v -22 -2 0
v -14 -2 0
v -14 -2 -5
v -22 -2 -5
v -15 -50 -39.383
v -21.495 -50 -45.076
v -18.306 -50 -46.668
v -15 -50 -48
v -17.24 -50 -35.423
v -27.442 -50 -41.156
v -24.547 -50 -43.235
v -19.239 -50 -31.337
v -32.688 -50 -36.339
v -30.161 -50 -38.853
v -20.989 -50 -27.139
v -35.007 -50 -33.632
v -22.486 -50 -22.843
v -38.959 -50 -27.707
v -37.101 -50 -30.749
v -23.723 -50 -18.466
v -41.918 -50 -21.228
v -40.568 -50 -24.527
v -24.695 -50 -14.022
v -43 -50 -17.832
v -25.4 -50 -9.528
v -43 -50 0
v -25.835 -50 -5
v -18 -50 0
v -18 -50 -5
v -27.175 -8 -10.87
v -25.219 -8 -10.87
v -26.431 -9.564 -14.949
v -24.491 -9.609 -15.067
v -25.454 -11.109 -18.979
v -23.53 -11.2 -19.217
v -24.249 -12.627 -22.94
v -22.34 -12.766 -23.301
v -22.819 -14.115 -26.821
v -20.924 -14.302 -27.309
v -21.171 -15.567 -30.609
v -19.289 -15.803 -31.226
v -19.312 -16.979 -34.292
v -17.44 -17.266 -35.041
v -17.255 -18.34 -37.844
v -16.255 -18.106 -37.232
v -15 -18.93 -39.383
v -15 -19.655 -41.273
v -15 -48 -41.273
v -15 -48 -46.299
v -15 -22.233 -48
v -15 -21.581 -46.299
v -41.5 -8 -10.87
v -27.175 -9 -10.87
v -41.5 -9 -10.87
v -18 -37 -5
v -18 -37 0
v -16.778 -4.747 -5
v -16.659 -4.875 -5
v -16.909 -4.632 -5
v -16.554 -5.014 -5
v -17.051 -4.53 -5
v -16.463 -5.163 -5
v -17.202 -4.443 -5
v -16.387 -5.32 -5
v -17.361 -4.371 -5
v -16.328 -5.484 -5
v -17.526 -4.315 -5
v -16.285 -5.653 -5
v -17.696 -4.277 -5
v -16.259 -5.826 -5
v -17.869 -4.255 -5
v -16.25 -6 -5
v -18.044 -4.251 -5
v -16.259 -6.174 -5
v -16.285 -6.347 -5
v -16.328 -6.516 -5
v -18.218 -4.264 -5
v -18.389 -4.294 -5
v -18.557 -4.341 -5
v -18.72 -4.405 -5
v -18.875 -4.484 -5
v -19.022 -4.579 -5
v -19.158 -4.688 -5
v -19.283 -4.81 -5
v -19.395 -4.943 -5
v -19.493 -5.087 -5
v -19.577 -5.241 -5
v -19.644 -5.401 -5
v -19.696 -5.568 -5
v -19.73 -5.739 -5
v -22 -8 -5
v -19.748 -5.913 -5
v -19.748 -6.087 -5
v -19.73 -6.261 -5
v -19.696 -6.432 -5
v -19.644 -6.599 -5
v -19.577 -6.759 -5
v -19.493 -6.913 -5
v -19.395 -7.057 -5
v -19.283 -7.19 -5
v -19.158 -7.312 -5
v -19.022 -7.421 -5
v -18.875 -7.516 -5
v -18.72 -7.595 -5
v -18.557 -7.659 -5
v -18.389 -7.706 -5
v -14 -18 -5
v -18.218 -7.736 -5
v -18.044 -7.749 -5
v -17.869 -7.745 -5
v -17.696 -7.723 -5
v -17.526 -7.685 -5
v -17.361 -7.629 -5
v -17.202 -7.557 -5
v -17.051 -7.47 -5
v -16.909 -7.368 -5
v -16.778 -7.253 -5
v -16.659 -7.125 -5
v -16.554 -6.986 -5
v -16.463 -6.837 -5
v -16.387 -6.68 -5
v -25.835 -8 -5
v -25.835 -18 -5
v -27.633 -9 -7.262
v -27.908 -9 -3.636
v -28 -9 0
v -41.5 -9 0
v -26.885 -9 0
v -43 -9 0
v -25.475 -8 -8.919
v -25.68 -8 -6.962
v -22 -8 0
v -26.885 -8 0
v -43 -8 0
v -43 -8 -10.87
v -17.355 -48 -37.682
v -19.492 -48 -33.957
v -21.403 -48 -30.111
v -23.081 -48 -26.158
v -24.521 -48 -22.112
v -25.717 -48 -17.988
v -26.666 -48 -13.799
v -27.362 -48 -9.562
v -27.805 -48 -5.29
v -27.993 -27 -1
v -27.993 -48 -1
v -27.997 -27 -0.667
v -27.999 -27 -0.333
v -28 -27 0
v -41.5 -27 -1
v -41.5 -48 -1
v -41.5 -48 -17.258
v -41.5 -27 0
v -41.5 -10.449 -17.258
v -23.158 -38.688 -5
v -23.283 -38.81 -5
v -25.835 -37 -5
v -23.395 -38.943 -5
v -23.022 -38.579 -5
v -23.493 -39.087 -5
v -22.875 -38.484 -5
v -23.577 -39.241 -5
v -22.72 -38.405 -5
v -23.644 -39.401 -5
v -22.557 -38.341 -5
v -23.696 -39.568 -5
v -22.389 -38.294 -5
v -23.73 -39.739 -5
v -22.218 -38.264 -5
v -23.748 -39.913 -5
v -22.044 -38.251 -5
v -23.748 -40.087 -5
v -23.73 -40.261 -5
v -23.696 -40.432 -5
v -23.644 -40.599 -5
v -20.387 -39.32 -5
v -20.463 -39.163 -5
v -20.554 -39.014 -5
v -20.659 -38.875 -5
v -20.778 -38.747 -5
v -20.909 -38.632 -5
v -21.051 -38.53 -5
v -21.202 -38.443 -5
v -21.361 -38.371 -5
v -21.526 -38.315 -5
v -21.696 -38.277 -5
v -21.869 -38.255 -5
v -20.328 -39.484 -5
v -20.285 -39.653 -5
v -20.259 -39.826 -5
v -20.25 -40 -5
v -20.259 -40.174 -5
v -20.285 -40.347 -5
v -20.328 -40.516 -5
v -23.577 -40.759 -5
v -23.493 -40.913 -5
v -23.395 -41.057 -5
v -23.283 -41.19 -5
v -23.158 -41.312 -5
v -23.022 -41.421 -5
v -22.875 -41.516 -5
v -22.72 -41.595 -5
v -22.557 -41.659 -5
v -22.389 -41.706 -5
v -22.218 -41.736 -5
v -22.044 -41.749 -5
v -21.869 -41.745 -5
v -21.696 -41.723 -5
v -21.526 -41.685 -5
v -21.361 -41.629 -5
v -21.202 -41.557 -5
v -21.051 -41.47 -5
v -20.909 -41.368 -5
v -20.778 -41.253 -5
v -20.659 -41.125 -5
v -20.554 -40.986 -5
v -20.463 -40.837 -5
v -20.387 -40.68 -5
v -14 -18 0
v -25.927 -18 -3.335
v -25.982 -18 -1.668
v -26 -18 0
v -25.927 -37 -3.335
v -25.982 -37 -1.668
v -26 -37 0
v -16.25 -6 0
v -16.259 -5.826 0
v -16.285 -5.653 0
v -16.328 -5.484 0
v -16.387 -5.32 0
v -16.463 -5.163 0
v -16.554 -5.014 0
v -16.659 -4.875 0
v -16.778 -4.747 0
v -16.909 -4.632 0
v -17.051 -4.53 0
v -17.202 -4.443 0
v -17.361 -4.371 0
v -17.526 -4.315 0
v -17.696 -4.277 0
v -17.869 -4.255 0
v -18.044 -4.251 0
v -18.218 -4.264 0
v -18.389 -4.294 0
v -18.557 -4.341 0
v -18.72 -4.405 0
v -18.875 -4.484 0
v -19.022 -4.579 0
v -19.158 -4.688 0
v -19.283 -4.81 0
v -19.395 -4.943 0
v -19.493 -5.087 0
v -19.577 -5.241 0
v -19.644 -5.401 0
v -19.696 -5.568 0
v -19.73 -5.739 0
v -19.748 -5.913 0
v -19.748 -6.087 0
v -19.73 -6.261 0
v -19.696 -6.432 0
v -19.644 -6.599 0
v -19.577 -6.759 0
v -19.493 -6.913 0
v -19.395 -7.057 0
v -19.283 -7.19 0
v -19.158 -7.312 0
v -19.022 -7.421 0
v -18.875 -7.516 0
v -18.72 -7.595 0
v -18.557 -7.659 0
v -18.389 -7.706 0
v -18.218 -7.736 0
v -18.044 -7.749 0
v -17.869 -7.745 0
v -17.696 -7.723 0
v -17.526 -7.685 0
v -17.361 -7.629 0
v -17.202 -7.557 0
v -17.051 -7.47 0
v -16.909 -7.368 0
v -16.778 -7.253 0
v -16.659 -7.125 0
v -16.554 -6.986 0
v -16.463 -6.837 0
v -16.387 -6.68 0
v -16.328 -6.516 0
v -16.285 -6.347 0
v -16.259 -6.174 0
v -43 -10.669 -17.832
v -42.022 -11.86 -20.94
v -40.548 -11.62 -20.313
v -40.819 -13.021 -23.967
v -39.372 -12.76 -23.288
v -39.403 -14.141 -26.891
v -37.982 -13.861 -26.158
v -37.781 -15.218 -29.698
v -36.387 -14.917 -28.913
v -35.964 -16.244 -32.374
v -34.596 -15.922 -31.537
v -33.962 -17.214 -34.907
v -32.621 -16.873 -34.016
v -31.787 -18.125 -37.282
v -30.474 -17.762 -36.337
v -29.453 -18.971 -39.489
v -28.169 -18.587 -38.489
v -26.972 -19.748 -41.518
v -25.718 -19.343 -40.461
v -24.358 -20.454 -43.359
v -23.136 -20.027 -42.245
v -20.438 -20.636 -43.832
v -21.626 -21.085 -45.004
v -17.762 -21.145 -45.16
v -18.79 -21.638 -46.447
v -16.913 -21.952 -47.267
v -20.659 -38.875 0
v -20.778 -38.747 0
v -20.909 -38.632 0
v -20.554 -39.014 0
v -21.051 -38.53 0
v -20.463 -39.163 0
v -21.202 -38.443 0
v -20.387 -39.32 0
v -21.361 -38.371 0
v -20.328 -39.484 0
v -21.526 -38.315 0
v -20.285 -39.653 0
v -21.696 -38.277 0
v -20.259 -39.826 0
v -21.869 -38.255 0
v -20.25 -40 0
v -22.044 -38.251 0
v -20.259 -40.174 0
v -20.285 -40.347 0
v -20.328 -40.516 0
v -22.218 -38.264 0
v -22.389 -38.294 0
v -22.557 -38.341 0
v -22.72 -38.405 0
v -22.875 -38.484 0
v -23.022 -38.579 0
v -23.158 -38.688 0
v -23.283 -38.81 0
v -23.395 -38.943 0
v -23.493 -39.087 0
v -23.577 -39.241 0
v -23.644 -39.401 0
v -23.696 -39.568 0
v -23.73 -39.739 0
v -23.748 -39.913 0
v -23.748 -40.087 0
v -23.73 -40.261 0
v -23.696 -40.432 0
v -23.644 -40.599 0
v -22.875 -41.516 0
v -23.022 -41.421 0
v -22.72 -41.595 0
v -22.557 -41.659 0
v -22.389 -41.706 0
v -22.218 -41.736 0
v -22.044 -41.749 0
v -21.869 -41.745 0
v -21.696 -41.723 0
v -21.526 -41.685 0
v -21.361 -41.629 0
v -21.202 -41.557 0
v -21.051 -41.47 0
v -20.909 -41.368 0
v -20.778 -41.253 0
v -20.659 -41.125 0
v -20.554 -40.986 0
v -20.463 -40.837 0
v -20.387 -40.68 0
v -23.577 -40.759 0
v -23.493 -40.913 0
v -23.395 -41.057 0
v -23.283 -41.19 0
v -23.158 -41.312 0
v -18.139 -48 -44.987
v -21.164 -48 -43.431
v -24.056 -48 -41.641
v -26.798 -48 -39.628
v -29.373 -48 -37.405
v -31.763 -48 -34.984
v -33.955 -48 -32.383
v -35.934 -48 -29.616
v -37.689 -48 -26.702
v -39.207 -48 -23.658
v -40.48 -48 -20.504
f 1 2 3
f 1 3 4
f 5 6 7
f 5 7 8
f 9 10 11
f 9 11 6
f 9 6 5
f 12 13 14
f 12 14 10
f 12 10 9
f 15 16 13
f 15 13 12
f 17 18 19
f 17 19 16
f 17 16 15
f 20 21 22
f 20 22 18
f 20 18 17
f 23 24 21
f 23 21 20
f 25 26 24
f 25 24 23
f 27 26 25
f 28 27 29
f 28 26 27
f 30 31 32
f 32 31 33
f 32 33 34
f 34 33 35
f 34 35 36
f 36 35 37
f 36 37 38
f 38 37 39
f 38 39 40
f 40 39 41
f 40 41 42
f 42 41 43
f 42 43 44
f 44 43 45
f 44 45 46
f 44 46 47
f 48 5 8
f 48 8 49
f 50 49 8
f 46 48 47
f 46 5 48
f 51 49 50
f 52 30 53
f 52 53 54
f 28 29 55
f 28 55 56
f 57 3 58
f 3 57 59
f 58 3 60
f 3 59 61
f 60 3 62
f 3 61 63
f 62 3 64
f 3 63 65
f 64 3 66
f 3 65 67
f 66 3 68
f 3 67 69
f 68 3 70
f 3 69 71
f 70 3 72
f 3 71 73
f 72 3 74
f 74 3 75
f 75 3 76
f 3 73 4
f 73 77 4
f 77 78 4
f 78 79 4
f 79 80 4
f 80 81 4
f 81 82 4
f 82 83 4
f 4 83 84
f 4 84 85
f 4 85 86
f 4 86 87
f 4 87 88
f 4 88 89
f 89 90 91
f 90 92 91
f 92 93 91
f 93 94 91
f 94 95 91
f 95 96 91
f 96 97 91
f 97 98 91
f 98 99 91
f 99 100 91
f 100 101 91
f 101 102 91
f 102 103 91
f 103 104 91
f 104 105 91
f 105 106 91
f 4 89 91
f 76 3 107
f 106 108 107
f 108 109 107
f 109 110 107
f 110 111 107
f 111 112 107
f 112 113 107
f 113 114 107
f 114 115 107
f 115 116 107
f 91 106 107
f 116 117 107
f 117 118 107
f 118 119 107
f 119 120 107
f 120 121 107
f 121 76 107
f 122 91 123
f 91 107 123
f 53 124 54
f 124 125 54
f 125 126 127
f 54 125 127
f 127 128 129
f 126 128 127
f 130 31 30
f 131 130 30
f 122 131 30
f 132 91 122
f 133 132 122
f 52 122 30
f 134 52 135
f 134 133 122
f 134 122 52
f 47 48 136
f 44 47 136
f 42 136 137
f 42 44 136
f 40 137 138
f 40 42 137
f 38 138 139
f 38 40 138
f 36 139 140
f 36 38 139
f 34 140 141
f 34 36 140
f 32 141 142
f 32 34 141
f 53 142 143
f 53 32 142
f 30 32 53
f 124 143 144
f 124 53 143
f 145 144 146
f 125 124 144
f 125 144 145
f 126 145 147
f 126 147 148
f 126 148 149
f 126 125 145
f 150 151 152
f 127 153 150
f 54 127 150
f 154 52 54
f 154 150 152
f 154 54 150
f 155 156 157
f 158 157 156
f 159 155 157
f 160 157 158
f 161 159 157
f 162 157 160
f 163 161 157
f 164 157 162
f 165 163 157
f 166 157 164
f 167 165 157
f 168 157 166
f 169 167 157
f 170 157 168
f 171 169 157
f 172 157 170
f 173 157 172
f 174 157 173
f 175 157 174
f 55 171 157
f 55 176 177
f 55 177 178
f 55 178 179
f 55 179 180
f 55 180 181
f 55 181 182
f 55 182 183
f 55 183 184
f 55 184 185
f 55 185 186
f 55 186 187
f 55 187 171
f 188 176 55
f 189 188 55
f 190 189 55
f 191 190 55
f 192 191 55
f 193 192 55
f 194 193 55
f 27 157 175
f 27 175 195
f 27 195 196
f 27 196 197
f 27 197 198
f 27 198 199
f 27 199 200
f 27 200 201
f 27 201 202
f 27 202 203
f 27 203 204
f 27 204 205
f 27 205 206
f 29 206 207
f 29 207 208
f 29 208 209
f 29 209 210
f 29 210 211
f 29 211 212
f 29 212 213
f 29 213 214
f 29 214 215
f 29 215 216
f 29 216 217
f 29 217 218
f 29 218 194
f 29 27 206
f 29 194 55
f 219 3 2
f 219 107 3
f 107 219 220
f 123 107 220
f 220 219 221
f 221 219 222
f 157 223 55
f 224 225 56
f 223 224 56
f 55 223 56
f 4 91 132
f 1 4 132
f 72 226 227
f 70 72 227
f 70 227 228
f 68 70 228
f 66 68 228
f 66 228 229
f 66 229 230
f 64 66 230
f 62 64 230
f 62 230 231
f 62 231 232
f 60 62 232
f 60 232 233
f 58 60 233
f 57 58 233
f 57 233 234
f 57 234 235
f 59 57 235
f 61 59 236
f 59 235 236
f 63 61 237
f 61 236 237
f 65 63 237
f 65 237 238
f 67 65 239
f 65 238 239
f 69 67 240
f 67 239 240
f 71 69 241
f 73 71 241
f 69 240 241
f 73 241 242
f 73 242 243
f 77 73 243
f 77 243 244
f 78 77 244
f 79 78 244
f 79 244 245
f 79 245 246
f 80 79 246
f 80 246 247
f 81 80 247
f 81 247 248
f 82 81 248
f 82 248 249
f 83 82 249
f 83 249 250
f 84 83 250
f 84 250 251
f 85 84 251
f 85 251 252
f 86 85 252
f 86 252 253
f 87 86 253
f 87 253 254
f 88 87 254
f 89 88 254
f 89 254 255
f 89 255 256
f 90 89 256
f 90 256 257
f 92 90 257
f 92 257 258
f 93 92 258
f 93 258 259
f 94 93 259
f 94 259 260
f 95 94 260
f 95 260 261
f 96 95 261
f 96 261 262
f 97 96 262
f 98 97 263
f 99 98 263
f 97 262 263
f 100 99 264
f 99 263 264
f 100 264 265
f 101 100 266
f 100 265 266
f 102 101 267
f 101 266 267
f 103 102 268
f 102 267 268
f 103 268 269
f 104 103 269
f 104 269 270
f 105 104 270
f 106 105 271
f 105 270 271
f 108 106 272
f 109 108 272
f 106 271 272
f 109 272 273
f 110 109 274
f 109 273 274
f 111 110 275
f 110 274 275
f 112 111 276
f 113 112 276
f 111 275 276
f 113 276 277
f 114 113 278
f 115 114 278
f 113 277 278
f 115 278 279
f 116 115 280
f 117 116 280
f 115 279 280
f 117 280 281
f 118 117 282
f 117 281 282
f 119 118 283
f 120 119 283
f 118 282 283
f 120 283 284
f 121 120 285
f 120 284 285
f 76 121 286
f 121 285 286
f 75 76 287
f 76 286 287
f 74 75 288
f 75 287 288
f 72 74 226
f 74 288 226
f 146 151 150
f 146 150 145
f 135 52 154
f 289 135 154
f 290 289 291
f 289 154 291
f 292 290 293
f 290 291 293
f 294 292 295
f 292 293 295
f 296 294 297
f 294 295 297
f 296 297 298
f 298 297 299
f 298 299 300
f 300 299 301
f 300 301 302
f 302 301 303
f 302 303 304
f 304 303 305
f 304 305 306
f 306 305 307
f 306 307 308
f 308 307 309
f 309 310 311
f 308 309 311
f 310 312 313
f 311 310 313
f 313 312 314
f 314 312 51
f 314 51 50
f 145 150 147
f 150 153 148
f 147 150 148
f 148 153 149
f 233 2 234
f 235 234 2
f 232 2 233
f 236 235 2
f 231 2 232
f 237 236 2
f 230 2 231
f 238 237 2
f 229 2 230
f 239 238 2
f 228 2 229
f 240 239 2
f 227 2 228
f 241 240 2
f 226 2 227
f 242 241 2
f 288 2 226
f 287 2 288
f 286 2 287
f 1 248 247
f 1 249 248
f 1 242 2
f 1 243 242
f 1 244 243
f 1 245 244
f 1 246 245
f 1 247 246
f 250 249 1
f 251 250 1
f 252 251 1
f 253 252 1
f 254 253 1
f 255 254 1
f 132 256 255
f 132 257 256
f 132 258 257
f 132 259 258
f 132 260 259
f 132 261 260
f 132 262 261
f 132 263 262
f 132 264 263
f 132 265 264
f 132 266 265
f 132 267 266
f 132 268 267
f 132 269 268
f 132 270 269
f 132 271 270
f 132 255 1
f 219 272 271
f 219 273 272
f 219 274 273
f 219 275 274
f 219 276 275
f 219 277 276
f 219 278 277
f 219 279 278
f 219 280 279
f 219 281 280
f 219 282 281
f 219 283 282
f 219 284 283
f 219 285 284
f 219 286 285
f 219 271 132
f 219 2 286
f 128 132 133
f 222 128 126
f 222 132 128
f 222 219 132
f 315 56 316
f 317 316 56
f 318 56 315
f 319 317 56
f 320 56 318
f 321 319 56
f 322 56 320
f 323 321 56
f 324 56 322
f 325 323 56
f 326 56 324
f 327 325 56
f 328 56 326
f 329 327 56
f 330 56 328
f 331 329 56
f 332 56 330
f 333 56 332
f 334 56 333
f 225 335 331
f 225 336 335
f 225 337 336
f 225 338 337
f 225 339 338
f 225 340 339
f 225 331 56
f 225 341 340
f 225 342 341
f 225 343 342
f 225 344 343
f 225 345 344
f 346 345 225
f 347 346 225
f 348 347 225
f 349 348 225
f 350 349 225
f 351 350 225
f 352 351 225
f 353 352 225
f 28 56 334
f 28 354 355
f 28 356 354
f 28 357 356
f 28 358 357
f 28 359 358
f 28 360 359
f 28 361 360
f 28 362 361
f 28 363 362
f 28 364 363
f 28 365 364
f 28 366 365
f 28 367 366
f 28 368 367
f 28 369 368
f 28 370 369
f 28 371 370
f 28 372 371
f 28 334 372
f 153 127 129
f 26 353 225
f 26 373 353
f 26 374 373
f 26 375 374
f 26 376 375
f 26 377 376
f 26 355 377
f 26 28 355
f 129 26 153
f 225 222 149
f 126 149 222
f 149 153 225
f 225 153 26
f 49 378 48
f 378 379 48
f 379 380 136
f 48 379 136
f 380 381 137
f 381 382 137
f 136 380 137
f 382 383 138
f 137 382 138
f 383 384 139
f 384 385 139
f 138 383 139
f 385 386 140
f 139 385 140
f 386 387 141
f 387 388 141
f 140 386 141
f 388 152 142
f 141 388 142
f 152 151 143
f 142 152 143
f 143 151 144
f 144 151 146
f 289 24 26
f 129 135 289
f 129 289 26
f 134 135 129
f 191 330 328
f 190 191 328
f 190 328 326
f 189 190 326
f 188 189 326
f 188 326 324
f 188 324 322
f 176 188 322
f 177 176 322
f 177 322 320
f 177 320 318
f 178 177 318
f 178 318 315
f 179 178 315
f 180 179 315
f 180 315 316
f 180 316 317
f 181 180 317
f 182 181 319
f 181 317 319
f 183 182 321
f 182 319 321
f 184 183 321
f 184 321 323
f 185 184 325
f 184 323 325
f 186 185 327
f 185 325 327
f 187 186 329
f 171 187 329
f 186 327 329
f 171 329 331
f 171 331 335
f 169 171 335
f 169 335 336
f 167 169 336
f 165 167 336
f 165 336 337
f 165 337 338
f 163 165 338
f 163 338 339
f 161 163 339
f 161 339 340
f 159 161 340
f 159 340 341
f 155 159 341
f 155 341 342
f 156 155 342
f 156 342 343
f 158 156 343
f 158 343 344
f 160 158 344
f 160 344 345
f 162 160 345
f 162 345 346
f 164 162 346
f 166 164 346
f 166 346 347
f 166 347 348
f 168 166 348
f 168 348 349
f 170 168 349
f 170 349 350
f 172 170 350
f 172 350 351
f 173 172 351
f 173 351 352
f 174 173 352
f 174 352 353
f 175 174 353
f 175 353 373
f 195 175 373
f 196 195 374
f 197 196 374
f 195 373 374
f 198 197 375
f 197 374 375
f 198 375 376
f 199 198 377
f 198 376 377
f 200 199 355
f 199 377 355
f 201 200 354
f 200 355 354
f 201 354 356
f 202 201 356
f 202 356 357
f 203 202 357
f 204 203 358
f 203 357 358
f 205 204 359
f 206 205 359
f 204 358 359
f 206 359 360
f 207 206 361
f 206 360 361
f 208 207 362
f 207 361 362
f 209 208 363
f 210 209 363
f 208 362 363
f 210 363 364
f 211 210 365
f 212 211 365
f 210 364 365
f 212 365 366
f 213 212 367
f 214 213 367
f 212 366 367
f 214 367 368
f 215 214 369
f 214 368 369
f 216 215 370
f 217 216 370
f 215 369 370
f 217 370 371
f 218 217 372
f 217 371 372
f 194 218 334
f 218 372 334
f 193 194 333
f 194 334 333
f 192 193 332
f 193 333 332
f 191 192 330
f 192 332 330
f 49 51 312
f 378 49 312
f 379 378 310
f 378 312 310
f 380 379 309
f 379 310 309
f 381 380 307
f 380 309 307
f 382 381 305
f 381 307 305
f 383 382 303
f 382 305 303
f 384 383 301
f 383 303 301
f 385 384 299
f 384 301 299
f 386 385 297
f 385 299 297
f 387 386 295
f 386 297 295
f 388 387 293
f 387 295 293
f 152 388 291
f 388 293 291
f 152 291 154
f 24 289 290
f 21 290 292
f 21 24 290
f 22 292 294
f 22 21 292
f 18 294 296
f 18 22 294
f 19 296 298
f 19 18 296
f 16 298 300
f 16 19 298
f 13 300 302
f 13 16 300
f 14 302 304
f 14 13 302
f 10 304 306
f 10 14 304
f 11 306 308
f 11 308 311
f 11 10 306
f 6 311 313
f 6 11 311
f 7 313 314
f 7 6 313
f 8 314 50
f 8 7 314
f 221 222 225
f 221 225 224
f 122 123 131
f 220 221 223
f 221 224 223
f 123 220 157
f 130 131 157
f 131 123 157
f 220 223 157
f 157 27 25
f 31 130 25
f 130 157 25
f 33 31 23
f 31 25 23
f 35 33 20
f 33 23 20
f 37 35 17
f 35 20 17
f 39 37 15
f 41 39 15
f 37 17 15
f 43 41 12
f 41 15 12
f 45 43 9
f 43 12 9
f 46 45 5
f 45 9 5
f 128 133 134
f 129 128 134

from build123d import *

# Parameters (mm, degrees)
SKETCH_W        = 28
SKETCH_H        = 42
PAD_DEPTH       = 48
POCKET_DEPTH    = 42.001
POCKET001_DEPTH = 28.001
POCKET002_DEPTH = 40
POCKET003_DEPTH = 42.001
SKETCH005_W     = 12.884712
SKETCH005_H     = 5
PAD001_DEPTH    = 10
SKETCH006_W     = 8
SKETCH006_H     = 5
PAD002_DEPTH    = 6
SKETCH007_W     = 9
SKETCH007_H     = 5
PAD003_DEPTH    = 13
SKETCH009_R     = 1.75
POCKET004_DEPTH = 6
SKETCH010_W     = 16.115288
SKETCH010_H     = 23
PAD004_DEPTH    = 1
SKETCH011_W     = 16.115288
SKETCH011_H     = 10.869565
PAD005_DEPTH    = 1


with BuildPart() as part:
    # Sketch → Pad (new body)
    with BuildSketch(Plane.XY):
        with Locations((-29, -29)):
            Rectangle(SKETCH_W, SKETCH_H)
    extrude(amount=-PAD_DEPTH)

    # Sketch001 (on Face3 of Pad) → Pocket (cut, through all)
    with BuildSketch(Plane.XZ.offset(50)):
        with BuildLine():
            ThreePointArc((-43, -17.83216), (-32.688295, -36.339337), (-15, -48))
            Line((-15, -48), (-62.101535, -92.662663))
            Line((-43, -17.83216), (-62.101535, -92.662663))
        make_face()
    extrude(amount=-POCKET_DEPTH, mode=Mode.SUBTRACT)

    # Sketch002 (on Face3 of Pocket) → Pocket001 (cut, through all)
    with BuildSketch(Plane.YZ.offset(-15)):
        Polygon((0, 10), (-23, -50), (20.241647, -57.218418), align=None)
    extrude(amount=-POCKET001_DEPTH, mode=Mode.SUBTRACT)

    # Sketch003 (on Face1 of Pocket001) → Pocket002 (cut)
    with BuildSketch(Plane(origin=(0, -8, 0), x_dir=(-1, 0, 0), z_dir=(0, 1, 0))):
        with BuildLine():
            Line((41.5, 3), (41.5, -17.25833))
            ThreePointArc((12.43, -47.164245), (30.833459, -35.971617), (41.5, -17.25833))
            Line((12.43, -44.72372), (12.43, -47.164245))
            ThreePointArc((12.43, -44.72372), (23.996206, -23.678239), (28, 0))
            Line((28, 3), (28, 0))
            Line((41.5, 3), (28, 3))
        make_face()
    extrude(amount=-POCKET002_DEPTH, mode=Mode.SUBTRACT)

    # Sketch004 (on Face10 of Pocket002) → Pocket003 (cut, through all)
    with BuildSketch(Plane.XZ.offset(50)):
        with BuildLine():
            ThreePointArc((-26, 0), (-13.012856, -42.489763), (21.51, -70.45793))
            Line((21.51, -70.45793), (50, 0))
            Line((-26, 0), (50, 0))
        make_face()
    extrude(amount=-POCKET003_DEPTH, mode=Mode.SUBTRACT)

    # Sketch005 (on Face1 of Pocket003) → Pad001 (join)
    with BuildSketch(Plane(origin=(0, -8, 0), x_dir=(-1, 0, 0), z_dir=(0, 1, 0))):
        with Locations((20.442356, -2.5)):
            Rectangle(SKETCH005_W, SKETCH005_H)
    extrude(amount=-PAD001_DEPTH)

    # Sketch006 (on Face13 of Pad001) → Pad002 (join)
    with BuildSketch(Plane(origin=(0, -8, 0), x_dir=(-1, 0, 0), z_dir=(0, 1, 0))):
        with Locations((18, -2.5)):
            Rectangle(SKETCH006_W, SKETCH006_H)
    extrude(amount=PAD002_DEPTH)

    # Sketch007 (on Face11 of Pad002) → Pad003 (join)
    with BuildSketch(Plane.XZ.offset(50)):
        with Locations((-22.5, -2.5)):
            Rectangle(SKETCH007_W, SKETCH007_H)
    extrude(amount=-PAD003_DEPTH)

    # Sketch009 (on Face24 of Pad003) → Pocket004 (cut)
    with BuildSketch(Plane.XY):
        with Locations((-18, -6)):
            Circle(SKETCH009_R)
        with Locations((-22, -40)):
            Circle(SKETCH009_R)
    extrude(amount=-POCKET004_DEPTH, mode=Mode.SUBTRACT)

    # Sketch010 (on Face2 of Pocket004) → Pad004 (join)
    with BuildSketch(Plane.XY):
        with Locations((-34.942356, -38.5)):
            Rectangle(SKETCH010_W, SKETCH010_H)
    extrude(amount=-PAD004_DEPTH)

    # Sketch011 (on Face39 of Pad004) → Pad005 (join)
    with BuildSketch(Plane(origin=(0, -8, 0), x_dir=(-1, 0, 0), z_dir=(0, 1, 0))):
        with Locations((34.942356, -5.434782)):
            Rectangle(SKETCH011_W, SKETCH011_H)
    extrude(amount=-PAD005_DEPTH)


solid = part.part
